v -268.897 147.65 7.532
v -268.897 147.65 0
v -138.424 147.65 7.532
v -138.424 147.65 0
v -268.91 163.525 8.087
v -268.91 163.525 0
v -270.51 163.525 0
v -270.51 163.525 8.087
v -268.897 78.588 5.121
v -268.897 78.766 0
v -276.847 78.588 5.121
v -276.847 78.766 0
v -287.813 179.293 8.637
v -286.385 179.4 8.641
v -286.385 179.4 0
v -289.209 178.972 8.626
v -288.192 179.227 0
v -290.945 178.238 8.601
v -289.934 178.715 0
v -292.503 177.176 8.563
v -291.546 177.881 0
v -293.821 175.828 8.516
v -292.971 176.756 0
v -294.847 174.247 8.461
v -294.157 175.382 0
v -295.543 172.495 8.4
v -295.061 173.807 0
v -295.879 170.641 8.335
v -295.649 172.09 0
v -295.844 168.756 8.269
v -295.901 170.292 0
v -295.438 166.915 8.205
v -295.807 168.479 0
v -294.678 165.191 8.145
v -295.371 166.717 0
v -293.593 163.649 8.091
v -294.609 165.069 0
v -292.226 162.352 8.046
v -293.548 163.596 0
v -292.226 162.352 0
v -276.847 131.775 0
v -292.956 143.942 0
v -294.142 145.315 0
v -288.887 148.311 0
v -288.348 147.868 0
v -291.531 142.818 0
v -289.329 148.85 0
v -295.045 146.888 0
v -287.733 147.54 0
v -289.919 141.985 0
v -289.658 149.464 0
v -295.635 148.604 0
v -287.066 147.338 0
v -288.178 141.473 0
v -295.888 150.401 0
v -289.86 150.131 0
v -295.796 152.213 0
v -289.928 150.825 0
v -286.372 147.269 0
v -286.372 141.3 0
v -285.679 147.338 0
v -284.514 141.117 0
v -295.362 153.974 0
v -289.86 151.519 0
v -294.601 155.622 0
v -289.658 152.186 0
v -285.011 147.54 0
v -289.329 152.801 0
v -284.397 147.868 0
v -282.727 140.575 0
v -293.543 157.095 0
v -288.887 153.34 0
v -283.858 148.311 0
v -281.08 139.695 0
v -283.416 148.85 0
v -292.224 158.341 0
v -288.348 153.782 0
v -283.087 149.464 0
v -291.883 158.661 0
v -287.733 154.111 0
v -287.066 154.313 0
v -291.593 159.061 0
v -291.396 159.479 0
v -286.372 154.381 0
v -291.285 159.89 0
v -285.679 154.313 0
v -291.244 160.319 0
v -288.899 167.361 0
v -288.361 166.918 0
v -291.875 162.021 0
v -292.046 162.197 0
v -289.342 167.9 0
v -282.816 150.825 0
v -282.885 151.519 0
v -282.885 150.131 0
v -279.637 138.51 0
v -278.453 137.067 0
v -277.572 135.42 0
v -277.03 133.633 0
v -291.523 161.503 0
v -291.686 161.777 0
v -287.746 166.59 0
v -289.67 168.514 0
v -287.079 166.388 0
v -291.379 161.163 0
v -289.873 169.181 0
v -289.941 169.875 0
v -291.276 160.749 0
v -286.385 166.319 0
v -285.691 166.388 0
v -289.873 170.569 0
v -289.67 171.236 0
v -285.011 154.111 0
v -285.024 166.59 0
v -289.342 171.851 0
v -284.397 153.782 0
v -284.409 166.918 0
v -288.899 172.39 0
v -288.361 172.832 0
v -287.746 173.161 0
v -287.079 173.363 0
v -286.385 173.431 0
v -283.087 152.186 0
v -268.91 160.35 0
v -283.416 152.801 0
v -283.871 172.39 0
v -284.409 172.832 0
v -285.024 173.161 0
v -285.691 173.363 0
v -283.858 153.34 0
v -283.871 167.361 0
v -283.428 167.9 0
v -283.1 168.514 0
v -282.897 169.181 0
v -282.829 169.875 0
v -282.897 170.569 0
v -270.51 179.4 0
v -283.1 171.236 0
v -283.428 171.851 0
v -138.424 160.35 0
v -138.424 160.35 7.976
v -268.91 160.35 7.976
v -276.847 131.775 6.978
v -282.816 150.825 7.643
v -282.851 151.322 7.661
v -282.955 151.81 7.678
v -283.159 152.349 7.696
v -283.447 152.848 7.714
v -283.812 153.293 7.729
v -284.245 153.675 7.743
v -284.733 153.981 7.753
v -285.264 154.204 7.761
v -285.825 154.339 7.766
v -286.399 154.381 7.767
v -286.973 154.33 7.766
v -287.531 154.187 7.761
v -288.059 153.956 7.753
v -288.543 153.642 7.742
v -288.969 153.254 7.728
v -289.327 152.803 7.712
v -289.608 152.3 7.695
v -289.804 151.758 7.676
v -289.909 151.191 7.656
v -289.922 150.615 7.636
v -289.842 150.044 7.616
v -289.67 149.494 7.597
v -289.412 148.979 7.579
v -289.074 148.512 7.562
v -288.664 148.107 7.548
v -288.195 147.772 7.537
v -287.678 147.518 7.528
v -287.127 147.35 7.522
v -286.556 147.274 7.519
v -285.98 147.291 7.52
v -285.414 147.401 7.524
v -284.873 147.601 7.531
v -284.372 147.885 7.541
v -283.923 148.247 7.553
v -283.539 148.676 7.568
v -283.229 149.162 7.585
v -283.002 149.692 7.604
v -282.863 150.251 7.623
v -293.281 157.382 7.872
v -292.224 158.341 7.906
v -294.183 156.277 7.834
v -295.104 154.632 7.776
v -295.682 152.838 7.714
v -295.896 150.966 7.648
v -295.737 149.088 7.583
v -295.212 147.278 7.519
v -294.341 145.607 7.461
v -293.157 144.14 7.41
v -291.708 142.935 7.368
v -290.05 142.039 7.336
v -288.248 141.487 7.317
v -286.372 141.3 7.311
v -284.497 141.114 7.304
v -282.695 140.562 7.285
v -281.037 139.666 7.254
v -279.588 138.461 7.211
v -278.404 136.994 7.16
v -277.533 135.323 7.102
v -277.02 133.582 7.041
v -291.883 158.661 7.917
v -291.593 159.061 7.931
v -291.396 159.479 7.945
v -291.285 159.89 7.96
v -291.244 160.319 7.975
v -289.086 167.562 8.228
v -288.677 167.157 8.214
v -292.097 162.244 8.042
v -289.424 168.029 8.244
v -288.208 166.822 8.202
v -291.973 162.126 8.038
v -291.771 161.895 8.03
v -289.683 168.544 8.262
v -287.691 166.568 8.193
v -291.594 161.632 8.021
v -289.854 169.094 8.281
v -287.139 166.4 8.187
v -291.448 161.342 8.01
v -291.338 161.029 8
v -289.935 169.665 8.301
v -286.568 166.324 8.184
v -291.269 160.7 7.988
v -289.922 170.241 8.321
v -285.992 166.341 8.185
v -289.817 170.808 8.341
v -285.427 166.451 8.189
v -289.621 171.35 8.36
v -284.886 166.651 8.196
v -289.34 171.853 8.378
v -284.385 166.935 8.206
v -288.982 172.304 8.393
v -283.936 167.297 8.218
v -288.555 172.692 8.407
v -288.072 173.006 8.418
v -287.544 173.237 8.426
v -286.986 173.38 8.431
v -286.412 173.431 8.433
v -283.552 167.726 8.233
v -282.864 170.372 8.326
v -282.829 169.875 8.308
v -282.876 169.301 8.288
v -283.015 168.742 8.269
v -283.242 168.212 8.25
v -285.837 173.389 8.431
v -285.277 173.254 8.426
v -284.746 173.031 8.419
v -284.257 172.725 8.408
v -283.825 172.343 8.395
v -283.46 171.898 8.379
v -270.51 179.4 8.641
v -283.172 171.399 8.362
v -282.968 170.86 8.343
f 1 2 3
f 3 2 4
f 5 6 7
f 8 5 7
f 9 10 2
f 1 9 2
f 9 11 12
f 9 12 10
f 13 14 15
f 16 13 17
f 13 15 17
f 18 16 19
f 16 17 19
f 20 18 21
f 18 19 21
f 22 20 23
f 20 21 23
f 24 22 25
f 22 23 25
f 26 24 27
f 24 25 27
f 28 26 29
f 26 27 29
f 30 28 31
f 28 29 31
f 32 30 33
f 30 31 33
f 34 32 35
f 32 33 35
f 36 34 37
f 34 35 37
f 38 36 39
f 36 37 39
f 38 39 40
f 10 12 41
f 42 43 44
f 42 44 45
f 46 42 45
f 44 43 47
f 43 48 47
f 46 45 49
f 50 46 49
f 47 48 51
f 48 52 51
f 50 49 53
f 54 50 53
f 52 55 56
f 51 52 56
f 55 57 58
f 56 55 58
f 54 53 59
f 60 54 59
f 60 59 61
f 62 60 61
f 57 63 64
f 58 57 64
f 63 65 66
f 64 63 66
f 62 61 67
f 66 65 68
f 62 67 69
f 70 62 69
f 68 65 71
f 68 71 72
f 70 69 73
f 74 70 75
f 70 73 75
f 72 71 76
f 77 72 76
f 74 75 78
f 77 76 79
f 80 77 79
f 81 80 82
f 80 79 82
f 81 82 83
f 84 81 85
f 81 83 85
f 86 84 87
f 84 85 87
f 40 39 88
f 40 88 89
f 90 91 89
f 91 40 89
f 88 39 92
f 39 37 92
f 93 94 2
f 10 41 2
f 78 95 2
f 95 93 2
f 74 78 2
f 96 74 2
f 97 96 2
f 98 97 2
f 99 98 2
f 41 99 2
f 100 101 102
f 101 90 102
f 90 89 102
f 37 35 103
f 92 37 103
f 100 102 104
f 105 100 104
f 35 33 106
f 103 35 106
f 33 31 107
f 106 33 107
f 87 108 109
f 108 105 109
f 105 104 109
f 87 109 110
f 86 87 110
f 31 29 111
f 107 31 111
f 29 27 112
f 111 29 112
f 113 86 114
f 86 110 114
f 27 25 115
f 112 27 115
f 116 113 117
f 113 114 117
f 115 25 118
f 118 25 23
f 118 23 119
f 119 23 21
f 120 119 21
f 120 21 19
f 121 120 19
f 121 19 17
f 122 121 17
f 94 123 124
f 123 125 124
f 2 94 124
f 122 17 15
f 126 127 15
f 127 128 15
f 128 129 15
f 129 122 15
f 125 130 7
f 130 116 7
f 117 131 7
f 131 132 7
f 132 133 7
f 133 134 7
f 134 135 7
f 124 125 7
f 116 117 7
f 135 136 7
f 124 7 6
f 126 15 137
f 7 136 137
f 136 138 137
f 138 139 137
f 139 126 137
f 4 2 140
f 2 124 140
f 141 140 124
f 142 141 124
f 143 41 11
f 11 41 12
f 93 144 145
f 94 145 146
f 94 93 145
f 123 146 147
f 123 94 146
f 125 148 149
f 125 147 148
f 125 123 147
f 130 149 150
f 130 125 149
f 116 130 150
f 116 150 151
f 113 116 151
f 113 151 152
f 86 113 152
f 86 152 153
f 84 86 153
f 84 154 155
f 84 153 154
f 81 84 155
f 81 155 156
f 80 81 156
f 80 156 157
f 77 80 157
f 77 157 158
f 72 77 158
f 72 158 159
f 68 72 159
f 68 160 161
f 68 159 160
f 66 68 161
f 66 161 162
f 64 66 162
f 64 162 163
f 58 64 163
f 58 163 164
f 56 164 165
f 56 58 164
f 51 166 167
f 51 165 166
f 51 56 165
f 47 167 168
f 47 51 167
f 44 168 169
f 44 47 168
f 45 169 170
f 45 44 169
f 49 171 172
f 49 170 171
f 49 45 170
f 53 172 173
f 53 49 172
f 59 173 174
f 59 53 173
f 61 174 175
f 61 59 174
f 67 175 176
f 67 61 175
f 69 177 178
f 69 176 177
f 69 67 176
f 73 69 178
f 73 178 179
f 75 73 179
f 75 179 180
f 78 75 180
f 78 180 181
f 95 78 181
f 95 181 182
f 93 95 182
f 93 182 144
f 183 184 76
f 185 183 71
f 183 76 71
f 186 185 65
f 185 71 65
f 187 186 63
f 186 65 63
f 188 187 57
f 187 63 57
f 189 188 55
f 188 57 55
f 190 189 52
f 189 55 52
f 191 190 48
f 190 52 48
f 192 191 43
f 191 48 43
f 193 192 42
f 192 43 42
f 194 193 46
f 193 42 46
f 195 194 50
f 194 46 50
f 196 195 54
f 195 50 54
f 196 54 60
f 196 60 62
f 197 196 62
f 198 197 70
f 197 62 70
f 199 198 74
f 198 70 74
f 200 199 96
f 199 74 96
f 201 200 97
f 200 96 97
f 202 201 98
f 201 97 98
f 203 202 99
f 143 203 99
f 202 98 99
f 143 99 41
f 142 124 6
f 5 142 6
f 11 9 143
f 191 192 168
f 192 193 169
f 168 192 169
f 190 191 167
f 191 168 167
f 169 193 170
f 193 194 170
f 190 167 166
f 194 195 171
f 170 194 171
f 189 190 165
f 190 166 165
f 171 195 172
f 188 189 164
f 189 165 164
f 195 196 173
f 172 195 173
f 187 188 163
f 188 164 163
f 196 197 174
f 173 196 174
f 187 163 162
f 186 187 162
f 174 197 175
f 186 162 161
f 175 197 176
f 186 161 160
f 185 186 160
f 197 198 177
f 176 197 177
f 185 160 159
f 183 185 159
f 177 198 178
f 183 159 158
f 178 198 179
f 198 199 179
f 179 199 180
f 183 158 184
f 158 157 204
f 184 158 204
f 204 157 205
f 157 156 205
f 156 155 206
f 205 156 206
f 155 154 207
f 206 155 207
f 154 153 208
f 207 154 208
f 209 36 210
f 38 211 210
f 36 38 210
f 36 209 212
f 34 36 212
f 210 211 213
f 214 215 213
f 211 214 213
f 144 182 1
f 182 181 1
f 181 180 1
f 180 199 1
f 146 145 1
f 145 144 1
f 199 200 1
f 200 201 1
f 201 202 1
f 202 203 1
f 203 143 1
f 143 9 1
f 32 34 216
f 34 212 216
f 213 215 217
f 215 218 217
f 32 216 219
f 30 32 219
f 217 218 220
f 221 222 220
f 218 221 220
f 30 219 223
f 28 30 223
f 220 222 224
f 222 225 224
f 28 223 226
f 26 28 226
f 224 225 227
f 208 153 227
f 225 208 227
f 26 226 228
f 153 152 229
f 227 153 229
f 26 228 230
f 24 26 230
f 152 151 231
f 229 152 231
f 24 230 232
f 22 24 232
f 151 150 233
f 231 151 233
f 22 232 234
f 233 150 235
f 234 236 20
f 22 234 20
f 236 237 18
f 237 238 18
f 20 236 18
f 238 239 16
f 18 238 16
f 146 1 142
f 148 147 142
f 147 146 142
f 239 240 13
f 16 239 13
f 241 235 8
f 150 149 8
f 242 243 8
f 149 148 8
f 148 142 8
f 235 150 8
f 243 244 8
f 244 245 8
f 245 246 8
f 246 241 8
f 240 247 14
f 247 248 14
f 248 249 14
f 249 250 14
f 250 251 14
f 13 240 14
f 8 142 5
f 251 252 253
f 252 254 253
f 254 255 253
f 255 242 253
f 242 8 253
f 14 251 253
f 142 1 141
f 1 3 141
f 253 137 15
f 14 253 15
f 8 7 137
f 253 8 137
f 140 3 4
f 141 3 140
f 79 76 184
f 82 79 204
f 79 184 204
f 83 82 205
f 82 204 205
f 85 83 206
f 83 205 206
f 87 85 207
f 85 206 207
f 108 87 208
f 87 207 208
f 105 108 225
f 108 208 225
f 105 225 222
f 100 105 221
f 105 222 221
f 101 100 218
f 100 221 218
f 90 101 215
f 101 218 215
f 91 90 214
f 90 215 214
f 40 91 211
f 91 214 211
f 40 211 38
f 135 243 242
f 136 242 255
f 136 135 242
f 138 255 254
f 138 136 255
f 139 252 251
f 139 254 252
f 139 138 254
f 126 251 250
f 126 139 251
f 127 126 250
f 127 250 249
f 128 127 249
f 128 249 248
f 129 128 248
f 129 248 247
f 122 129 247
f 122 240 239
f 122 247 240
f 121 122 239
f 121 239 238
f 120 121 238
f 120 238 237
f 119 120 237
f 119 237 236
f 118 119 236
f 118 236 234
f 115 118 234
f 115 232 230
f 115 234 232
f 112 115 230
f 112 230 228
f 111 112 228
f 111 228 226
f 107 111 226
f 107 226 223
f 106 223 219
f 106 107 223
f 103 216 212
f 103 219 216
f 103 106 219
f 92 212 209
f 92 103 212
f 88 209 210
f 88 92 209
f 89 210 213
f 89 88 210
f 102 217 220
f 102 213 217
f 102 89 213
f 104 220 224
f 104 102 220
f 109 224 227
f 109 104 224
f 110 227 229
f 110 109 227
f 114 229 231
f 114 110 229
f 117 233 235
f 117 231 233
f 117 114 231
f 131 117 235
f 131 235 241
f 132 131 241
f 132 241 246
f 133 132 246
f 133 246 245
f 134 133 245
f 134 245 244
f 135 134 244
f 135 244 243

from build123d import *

# Parameters (mm, degrees)
BOSS_EXTRUDE1_OUTLINE_R = 3.556
BOSS_EXTRUDE1_OUTLINE_W = 260.9469
BOSS_EXTRUDE1_OUTLINE_H = 138.1252
BOSS_EXTRUDE1_DEPTH     = 76.2
CUT_EXTRUDE1_DEPTH      = 355.32482824
CUT_EXTRUDE1_DEPTH_BACK = 355.32482824
FILLET1_R               = 2.54
SKETCH7_W               = 260.9469
SKETCH7_H               = 22.1996
CUT_EXTRUDE2_DEPTH      = 347.152897849
FILLET2_R               = 6.35
SKETCH8_W               = 217.439036591
SKETCH8_H               = 235.521960295
CUT_EXTRUDE4_DEPTH      = 347.144751077
SKETCH9_W               = 181.772335281
SKETCH9_H               = 128.639747743
CUT_EXTRUDE5_DEPTH      = 347.144751077


# Read off the part's stored shape, not the designer's step: Boss-Extrude1
with BuildPart() as part:
    # Boss-Extrude1 outline → Boss-Extrude1 (new body)
    with BuildSketch(Plane.XY):
        with BuildLine():
            Line((-286.3596, -22.225), (9.525, -22.225))
            ThreePointArc((9.525, -22.225), (19.05, -12.7), (9.525, -3.175))
            ThreePointArc((9.525, -3.175), (19.05, 6.35), (9.525, 15.875))
            ThreePointArc((9.525, 15.875), (2.789807909, 18.664807909), (0, 25.4))
            Line((0, 25.4), (0, 131.7752))
            ThreePointArc((0, 131.7752), (2.789807909, 138.510392091), (9.525, 141.3002))
            ThreePointArc((9.525, 141.3002), (19.05, 150.8252), (9.525, 160.3502))
            ThreePointArc((9.525, 160.3502), (19.05, 169.8752), (9.525, 179.4002))
            Line((9.525, 179.4002), (-6.35, 179.4002))
            Line((-6.35, 179.4002), (-6.35, 163.5252))
            Line((-6.35, 163.5252), (-7.9502, 163.5252))
            Line((-7.9502, 163.5252), (-7.9502, 160.3502))
            Line((-7.9502, 160.3502), (-268.9098, 160.3502))
            Line((-268.9098, 160.3502), (-268.9098, 163.5252))
            Line((-268.9098, 163.5252), (-270.51, 163.5252))
            Line((-270.51, 163.5252), (-270.51, 179.4002))
            Line((-270.51, 179.4002), (-286.385, 179.4002))
            ThreePointArc((-286.385, 179.4002), (-295.91, 169.8752), (-286.385, 160.3502))
            ThreePointArc((-286.385, 160.3502), (-295.897297883, 150.818850004), (-286.3723, 141.3002))
            ThreePointArc((-286.3723, 141.3002), (-279.637107909, 138.510392091), (-276.8473, 131.7752))
            Line((-276.8473, 131.7752), (-276.8473, 25.4))
            ThreePointArc((-276.8473, 25.4), (-279.637107909, 18.664807909), (-286.3723, 15.875))
            ThreePointArc((-286.3723, 15.875), (-295.8973, 6.35), (-286.3723, -3.175))
            ThreePointArc((-286.3723, -3.175), (-295.884597883, -12.706349996), (-286.3596, -22.225))
        make_face()
        with Locations((-286.3596, -12.7)):
            Circle(BOSS_EXTRUDE1_OUTLINE_R, mode=Mode.SUBTRACT)
        with Locations((-286.3723, 6.35)):
            Circle(BOSS_EXTRUDE1_OUTLINE_R, mode=Mode.SUBTRACT)
        with Locations((9.525, -12.7)):
            Circle(BOSS_EXTRUDE1_OUTLINE_R, mode=Mode.SUBTRACT)
        with Locations((9.525, 6.35)):
            Circle(BOSS_EXTRUDE1_OUTLINE_R, mode=Mode.SUBTRACT)
        with Locations((-286.3723, 150.8252)):
            Circle(BOSS_EXTRUDE1_OUTLINE_R, mode=Mode.SUBTRACT)
        with Locations((-286.385, 169.8752)):
            Circle(BOSS_EXTRUDE1_OUTLINE_R, mode=Mode.SUBTRACT)
        with Locations((-138.42365, 78.5876)):
            Rectangle(BOSS_EXTRUDE1_OUTLINE_W, BOSS_EXTRUDE1_OUTLINE_H, mode=Mode.SUBTRACT)
        with Locations((9.525, 150.8252)):
            Circle(BOSS_EXTRUDE1_OUTLINE_R, mode=Mode.SUBTRACT)
        with Locations((9.525, 169.8752)):
            Circle(BOSS_EXTRUDE1_OUTLINE_R, mode=Mode.SUBTRACT)
    extrude(amount=BOSS_EXTRUDE1_DEPTH)

    # Sketch5 → Cut-Extrude1 (cut, two sides: drawn at the far end of the back side and taken through both)
    with BuildSketch(Plane.ZY.offset(276.8473).offset(-CUT_EXTRUDE1_DEPTH_BACK)):
        Polygon((1.6002, -22.225), (8.641107133, 179.4002), (76.2, 179.4002), (76.2, -22.225), align=None)
    extrude(amount=CUT_EXTRUDE1_DEPTH + CUT_EXTRUDE1_DEPTH_BACK, mode=Mode.SUBTRACT)

    # Fillet1
    fillet1_edges = [part.edges().sort_by_distance(p)[0] for p in [
        (-286.385, 160.3502, 3.987933237),
        (-286.3723, -3.175, 1.132720329),
        (9.525, -3.175, 1.132720329),
        (9.525, 160.3502, 3.987933237),
    ]]
    fillet(fillet1_edges, radius=FILLET1_R)

    # Sketch7 → Cut-Extrude2 (cut, through all)
    with BuildSketch(Plane(origin=(0, 0, 0), x_dir=(-1, 0, 0), z_dir=(0, 0, -1))):
        with Locations((138.42365, -6.35)):
            Rectangle(SKETCH7_W, SKETCH7_H)
    extrude(amount=-CUT_EXTRUDE2_DEPTH, mode=Mode.SUBTRACT)

    # Fillet2
    fillet2_edges = [part.edges().sort_by_distance(p)[0] for p in [
        (-268.8971, 4.7498, 1.271090386),
        (-268.8971, -17.4498, 0.883476829),
        (-7.9502, -17.4498, 0.883476829),
        (-7.9502, 4.7498, 1.271090386),
    ]]
    fillet(fillet2_edges, radius=FILLET2_R)

    # Sketch8 → Cut-Extrude4 (cut, through all)
    with BuildSketch(Plane(origin=(0, -0.082881646, 2.373419811), x_dir=(1, 0, 0), z_dir=(0, -0.03489949670250444, 0.9993908270190958))):
        with Locations((-29.704131704, 74.917246318)):
            Rectangle(SKETCH8_W, SKETCH8_H)
    extrude(amount=-CUT_EXTRUDE4_DEPTH, mode=Mode.SUBTRACT)

    # Sketch9 → Cut-Extrude5 (cut, through all)
    with BuildSketch(Plane(origin=(0, -0.082881646, 2.373419811), x_dir=(1, 0, 0), z_dir=(0, -0.03489949670250444, 0.9993908270190958))):
        with Locations((-229.309817641, 14.398560918)):
            Rectangle(SKETCH9_W, SKETCH9_H)
    extrude(amount=-CUT_EXTRUDE5_DEPTH, mode=Mode.SUBTRACT)


solid = part.part
